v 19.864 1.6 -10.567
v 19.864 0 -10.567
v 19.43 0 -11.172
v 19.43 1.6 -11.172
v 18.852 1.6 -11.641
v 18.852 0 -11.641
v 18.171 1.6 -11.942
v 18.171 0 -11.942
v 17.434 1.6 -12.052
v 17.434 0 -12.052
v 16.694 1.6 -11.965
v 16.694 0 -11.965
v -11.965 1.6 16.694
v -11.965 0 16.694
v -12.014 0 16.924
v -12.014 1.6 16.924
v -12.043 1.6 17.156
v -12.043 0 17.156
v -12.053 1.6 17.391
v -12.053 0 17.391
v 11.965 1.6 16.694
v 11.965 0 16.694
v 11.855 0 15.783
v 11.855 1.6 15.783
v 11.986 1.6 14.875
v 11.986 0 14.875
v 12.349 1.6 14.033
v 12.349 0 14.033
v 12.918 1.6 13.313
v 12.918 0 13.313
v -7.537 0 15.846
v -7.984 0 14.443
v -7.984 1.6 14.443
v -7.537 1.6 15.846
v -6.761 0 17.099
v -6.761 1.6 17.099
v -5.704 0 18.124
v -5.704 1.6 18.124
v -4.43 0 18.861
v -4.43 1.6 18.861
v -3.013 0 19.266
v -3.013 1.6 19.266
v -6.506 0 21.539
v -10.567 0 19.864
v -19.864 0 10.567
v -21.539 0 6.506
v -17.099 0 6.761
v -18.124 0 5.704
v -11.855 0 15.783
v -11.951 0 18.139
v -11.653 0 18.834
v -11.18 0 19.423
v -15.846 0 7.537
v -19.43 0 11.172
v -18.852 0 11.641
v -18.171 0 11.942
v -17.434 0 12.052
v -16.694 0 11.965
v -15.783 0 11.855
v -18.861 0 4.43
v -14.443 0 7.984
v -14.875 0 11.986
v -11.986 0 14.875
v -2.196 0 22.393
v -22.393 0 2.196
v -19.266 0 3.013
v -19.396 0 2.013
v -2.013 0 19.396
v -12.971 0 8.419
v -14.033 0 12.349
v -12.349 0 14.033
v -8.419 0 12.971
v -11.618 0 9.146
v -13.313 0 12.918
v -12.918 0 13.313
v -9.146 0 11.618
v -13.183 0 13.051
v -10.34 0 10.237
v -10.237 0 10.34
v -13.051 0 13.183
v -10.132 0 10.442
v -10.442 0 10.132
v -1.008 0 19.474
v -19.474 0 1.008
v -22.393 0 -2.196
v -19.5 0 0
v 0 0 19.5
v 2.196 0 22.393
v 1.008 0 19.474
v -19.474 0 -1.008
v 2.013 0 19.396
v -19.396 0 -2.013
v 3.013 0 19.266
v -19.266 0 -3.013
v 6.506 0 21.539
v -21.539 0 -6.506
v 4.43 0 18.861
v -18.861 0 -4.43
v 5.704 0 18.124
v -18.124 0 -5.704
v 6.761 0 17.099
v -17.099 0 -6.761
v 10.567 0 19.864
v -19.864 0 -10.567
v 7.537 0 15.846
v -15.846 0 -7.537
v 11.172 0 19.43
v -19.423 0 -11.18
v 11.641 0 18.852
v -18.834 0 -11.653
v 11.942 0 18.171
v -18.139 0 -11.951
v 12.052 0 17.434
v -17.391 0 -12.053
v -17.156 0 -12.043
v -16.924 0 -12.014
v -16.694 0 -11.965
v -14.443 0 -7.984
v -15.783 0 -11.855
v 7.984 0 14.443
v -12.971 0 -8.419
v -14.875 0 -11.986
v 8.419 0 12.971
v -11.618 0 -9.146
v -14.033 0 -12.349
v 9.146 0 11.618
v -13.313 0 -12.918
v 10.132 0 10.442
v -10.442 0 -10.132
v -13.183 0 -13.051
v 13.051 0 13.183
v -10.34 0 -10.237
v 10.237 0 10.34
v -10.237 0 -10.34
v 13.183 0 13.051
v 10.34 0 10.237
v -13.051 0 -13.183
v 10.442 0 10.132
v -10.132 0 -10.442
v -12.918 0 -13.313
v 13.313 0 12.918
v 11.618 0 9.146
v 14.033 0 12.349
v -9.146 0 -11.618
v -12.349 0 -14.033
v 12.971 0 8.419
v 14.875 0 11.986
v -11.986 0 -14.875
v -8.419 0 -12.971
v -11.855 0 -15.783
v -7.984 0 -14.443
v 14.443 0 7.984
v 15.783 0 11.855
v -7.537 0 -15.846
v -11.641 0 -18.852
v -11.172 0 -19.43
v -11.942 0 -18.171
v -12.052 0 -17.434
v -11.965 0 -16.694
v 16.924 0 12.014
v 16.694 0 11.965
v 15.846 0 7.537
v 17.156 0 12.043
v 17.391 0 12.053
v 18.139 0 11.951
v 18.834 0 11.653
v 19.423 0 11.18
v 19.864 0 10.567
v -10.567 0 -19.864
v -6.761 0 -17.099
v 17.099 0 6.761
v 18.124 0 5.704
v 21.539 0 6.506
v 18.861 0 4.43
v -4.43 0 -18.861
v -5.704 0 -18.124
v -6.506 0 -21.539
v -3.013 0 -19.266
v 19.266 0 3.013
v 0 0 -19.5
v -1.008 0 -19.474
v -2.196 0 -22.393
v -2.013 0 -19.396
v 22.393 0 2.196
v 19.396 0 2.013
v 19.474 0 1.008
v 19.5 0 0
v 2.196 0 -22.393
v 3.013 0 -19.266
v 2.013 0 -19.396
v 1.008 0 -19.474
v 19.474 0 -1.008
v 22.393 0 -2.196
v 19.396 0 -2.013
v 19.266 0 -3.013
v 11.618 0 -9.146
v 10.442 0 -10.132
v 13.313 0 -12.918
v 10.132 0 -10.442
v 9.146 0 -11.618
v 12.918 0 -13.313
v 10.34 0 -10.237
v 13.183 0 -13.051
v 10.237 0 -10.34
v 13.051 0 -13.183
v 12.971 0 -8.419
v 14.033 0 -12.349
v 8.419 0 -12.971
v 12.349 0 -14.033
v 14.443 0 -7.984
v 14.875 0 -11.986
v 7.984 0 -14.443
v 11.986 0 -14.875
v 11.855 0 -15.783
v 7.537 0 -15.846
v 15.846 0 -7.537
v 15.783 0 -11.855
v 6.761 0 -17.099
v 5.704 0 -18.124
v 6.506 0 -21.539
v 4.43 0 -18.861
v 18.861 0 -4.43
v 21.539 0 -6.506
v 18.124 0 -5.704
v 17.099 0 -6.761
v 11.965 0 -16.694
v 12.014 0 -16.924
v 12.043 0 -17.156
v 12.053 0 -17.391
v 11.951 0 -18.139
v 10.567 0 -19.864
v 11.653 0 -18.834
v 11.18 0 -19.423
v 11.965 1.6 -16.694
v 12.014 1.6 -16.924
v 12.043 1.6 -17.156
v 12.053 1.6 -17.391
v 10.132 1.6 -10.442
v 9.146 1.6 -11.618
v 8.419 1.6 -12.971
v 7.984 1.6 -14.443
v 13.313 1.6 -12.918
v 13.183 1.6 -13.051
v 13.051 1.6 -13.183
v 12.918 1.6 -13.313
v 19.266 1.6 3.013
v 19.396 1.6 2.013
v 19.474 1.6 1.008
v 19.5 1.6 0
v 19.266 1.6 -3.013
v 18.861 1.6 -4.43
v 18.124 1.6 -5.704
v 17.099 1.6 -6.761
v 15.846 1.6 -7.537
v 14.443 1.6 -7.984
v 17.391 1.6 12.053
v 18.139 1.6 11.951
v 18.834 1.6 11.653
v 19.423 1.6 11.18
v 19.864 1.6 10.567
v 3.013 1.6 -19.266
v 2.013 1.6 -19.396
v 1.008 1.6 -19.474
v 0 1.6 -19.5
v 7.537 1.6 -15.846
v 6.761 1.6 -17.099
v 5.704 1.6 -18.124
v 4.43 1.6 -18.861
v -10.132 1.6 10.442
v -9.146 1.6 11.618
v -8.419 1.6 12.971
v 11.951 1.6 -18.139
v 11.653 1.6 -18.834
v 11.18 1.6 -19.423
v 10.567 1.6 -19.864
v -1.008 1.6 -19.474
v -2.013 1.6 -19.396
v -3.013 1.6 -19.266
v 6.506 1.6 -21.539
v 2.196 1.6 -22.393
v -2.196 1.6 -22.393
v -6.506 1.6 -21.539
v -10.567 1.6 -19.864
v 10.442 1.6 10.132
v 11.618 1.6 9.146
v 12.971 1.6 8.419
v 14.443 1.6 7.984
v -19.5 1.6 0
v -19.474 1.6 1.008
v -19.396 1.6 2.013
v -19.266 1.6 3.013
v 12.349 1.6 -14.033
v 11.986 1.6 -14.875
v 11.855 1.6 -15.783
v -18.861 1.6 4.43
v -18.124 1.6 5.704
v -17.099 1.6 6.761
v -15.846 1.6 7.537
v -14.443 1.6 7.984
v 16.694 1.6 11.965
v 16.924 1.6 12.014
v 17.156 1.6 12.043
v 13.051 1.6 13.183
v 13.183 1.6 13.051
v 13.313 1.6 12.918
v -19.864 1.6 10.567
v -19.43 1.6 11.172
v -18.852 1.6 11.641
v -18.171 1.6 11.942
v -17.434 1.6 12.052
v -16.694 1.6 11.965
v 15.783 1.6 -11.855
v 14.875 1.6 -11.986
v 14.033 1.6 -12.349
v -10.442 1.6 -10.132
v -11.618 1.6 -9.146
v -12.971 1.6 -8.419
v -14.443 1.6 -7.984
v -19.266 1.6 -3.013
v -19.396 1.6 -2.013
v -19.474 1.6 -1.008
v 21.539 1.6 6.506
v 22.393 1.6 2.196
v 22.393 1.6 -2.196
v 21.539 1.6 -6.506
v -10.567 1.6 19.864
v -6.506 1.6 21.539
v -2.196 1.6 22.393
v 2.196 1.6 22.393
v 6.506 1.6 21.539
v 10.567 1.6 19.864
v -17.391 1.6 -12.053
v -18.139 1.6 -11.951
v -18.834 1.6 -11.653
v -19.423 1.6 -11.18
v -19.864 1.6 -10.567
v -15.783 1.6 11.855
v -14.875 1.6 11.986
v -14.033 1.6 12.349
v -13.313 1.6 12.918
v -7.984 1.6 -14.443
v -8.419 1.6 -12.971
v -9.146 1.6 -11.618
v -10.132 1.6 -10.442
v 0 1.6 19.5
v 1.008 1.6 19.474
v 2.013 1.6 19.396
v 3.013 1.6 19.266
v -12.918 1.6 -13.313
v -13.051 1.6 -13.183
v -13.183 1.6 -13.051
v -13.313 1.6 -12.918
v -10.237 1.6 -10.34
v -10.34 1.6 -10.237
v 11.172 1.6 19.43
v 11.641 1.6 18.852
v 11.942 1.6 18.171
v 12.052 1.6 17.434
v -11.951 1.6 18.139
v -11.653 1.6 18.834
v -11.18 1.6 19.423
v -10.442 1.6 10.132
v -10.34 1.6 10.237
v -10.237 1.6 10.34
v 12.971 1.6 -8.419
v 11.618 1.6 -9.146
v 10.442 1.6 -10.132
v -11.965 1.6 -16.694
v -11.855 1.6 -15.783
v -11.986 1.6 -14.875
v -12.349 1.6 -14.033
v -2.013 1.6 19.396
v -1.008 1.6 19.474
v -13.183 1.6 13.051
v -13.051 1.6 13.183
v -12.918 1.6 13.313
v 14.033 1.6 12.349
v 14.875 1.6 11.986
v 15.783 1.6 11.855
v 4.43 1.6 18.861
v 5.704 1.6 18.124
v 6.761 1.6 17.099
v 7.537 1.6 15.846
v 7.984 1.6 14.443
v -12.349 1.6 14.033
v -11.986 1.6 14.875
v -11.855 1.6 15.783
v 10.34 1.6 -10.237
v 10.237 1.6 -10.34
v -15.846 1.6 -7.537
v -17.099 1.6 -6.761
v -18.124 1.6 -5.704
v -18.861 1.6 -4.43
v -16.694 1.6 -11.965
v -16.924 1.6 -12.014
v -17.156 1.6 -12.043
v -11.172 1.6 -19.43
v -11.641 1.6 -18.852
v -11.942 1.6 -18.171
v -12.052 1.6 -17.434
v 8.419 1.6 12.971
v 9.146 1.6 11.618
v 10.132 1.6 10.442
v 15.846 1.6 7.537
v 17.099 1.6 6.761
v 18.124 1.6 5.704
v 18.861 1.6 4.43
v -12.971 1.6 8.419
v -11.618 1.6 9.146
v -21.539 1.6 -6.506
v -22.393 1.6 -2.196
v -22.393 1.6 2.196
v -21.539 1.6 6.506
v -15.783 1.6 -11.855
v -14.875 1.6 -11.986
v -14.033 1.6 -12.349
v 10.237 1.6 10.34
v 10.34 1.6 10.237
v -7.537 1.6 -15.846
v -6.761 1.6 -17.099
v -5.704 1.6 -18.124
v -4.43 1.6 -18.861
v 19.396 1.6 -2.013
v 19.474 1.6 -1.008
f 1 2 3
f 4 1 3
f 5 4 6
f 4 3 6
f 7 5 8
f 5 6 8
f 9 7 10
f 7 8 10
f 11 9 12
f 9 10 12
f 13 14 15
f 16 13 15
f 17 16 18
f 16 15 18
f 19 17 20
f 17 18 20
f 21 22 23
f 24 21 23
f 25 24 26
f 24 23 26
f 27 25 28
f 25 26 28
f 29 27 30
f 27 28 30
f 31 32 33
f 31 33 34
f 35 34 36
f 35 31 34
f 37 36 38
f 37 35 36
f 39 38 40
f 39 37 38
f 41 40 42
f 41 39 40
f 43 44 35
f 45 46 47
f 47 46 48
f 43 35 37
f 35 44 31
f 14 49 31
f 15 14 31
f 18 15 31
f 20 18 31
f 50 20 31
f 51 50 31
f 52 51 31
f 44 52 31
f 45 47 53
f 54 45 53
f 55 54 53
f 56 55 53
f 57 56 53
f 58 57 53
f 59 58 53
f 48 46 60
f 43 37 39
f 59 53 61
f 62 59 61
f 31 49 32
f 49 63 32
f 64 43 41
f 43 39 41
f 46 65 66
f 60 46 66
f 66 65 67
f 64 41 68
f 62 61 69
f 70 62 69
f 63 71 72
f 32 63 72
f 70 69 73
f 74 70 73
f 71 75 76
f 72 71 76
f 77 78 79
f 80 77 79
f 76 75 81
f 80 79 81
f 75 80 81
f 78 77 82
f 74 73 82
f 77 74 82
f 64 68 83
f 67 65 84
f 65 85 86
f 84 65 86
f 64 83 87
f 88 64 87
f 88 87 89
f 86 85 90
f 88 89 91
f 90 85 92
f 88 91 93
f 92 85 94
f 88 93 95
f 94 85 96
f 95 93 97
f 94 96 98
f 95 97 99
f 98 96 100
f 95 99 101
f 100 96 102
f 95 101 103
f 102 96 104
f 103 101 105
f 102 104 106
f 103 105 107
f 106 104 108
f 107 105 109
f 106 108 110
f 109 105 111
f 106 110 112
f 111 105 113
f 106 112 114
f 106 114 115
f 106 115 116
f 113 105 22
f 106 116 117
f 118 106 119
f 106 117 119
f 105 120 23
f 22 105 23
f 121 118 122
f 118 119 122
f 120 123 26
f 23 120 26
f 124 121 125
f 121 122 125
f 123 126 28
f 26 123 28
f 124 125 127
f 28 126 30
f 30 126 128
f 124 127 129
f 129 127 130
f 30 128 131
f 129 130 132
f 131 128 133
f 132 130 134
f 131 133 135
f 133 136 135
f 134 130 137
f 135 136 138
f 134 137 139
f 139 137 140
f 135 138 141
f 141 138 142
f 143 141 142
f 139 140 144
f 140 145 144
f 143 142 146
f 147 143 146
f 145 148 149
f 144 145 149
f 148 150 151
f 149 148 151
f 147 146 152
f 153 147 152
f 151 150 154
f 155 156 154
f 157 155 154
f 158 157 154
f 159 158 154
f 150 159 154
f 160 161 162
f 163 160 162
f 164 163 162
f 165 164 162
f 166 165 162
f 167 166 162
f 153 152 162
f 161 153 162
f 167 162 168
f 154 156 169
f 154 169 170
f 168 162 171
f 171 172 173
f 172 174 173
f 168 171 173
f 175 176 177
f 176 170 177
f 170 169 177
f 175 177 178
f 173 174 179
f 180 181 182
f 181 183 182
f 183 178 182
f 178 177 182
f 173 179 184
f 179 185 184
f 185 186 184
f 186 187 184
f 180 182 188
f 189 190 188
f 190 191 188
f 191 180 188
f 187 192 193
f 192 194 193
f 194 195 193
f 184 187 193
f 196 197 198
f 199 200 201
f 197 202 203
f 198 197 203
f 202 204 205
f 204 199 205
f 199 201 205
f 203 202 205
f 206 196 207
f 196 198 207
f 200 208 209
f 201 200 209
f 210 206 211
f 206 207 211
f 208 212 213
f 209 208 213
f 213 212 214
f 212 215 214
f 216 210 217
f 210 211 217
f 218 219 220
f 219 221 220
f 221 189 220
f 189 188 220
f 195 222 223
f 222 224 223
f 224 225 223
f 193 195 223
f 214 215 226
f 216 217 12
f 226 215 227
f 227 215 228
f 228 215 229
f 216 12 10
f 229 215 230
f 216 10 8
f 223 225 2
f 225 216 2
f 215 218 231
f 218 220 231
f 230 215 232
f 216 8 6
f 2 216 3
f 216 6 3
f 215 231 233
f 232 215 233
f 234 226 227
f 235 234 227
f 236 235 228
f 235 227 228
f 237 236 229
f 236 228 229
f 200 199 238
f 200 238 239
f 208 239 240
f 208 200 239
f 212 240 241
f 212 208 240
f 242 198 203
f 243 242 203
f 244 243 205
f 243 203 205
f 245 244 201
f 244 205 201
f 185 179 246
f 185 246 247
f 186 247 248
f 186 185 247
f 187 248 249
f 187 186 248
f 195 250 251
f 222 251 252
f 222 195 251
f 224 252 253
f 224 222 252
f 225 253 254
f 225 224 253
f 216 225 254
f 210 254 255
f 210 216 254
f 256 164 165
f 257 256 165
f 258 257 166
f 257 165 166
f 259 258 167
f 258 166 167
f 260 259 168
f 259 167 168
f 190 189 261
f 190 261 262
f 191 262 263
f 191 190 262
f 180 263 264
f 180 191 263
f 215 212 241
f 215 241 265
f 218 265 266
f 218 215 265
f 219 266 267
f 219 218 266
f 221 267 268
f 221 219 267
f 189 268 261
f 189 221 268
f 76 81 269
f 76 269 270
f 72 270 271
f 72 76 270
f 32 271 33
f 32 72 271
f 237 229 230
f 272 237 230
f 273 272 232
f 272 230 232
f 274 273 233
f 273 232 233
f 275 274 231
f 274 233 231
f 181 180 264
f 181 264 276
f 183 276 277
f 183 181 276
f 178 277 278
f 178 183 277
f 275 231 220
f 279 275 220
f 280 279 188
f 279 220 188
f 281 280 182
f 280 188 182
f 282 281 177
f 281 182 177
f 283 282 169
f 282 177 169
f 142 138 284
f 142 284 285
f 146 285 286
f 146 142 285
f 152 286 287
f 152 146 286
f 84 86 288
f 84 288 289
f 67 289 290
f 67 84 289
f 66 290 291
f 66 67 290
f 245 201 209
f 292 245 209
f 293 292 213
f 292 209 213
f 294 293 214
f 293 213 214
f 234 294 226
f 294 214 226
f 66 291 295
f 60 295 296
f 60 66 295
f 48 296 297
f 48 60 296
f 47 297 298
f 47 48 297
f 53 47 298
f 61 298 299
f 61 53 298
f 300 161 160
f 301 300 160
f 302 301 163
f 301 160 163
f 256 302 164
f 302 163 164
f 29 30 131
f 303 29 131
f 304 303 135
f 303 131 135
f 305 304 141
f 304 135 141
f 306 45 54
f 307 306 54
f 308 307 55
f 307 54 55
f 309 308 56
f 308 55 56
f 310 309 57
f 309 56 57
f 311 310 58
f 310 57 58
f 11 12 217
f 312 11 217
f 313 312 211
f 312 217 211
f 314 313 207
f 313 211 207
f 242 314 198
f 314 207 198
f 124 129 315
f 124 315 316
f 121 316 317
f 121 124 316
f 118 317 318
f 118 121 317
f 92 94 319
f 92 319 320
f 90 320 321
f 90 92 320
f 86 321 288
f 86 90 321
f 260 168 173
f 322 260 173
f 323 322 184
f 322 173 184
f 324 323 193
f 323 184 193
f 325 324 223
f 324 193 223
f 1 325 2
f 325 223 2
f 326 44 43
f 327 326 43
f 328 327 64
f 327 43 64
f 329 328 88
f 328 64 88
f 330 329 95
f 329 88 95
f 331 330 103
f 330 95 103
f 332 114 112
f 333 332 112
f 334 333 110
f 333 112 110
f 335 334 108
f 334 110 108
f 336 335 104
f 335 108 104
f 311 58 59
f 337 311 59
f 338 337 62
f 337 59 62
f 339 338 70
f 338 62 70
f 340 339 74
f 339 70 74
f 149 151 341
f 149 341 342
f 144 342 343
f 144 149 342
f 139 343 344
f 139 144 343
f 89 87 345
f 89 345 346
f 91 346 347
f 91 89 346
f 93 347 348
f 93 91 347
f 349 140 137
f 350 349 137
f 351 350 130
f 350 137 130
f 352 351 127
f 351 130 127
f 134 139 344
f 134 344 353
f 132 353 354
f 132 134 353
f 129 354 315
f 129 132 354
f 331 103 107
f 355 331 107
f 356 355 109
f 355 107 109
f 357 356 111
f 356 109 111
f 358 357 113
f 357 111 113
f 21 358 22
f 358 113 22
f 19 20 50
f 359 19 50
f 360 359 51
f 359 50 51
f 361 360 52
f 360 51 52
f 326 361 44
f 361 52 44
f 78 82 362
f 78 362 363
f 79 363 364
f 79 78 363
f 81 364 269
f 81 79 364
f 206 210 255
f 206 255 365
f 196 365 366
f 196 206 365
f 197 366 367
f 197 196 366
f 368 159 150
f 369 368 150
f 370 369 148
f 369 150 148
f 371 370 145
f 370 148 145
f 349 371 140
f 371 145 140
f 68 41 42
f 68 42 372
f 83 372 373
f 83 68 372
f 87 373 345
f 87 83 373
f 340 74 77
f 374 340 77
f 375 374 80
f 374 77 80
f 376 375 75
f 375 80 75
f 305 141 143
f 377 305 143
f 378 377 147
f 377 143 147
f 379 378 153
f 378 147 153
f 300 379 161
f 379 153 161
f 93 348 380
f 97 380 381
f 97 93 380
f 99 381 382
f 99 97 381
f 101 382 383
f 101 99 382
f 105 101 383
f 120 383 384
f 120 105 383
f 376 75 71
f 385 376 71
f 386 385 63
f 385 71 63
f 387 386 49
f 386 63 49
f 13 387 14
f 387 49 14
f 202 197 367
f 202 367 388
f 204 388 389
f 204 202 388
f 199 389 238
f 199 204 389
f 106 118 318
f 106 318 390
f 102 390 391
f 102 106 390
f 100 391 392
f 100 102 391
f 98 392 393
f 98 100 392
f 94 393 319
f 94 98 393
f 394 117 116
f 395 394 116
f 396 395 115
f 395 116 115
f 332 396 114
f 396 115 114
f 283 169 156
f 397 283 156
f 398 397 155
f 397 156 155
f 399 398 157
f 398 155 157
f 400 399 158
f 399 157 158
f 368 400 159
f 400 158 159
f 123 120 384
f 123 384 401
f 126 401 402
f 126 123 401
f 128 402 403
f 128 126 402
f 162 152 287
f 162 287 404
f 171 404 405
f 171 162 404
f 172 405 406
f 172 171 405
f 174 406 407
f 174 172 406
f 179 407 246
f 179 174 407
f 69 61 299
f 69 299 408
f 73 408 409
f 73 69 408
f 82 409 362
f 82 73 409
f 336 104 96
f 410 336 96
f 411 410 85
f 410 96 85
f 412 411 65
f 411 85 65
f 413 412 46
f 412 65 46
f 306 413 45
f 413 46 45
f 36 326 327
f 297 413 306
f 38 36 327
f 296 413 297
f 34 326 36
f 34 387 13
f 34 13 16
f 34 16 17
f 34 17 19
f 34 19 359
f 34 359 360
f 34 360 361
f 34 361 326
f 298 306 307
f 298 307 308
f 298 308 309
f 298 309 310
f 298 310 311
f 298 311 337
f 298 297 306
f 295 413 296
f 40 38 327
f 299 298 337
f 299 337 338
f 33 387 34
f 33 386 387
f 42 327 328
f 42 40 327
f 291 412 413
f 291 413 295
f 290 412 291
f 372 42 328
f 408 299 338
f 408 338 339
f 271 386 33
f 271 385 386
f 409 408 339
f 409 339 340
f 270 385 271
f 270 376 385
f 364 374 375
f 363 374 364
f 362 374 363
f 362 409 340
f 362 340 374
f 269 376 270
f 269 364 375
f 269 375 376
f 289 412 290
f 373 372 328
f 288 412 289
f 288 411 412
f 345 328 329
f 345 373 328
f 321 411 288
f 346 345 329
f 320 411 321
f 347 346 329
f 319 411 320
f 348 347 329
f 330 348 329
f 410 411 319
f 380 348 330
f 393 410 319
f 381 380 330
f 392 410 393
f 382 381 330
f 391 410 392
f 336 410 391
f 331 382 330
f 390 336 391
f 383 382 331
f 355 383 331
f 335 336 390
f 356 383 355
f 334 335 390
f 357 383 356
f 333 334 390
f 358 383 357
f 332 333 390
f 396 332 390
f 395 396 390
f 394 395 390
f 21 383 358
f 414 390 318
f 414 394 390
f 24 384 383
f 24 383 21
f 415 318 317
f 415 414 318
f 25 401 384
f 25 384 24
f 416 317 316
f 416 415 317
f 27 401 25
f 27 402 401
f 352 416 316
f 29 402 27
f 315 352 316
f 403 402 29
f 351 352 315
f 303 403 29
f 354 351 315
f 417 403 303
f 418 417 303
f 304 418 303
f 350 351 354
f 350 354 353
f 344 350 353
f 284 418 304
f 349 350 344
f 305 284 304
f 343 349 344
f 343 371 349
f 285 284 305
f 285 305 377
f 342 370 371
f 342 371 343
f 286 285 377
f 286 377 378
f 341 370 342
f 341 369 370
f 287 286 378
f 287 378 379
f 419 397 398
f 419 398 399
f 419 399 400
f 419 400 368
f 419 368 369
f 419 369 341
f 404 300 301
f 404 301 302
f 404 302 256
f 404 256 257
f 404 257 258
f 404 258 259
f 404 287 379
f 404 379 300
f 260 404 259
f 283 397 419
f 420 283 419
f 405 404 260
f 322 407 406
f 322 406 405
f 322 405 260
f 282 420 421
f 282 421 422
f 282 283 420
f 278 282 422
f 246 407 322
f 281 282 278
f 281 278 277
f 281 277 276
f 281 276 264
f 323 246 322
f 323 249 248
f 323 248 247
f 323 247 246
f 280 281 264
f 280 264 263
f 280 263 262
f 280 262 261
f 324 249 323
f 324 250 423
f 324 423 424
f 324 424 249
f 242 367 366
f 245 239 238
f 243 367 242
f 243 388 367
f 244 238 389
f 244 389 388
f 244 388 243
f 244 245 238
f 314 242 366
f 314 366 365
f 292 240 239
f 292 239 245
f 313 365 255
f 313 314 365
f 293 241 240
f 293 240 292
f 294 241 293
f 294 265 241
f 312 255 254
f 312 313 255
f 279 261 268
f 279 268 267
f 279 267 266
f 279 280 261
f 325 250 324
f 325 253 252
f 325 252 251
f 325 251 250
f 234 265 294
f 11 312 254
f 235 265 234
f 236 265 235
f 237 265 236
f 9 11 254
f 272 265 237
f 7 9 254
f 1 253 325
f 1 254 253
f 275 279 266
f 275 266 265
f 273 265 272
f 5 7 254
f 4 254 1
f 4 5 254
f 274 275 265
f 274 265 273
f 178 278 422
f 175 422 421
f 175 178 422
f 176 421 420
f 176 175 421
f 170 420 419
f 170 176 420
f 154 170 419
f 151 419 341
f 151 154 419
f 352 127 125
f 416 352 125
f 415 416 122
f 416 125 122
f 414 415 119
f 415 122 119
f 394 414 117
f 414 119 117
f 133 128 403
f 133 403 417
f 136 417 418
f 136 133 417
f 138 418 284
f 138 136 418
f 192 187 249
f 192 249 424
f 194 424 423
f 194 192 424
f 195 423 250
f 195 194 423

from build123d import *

# Parameters (mm, degrees)
BOSS_EXTRUDE1_DEPTH = 1.6
CUT_EXTRUDE2_DEPTH  = 2.6


with BuildPart() as part:
    # Internal Slab → Boss-Extrude1 (new body)
    with BuildSketch(Plane(origin=(0, 0, 0), x_dir=(1, 0, 0), z_dir=(0, 1, 0))):
        with BuildLine():
            ThreePointArc((19.864398082, 10.566725549), (18.521398428, 11.814512636), (16.694380928, 11.964937844))
            ThreePointArc((16.694380928, 11.964937844), (14.875391632, 11.986370035), (13.312847331, 12.91784022))
            ThreePointArc((13.312847331, 12.91784022), (13.116830791, 13.116830791), (12.91784022, 13.312847331))
            ThreePointArc((12.91784022, 13.312847331), (11.986370035, 14.875391632), (11.964937844, 16.694380928))
            ThreePointArc((11.964937844, 16.694380928), (12.030759646, 17.039737643), (12.052815994, 17.390618375))
            ThreePointArc((12.052815994, 17.390618375), (11.652730082, 18.833536499), (10.566725549, 19.864398082))
            ThreePointArc((10.566725549, 19.864398082), (0, 22.5), (-10.566725549, 19.864398082))
            ThreePointArc((-10.566725549, 19.864398082), (-11.814512636, 18.521398428), (-11.964937844, 16.694380928))
            ThreePointArc((-11.964937844, 16.694380928), (-11.986370035, 14.875391632), (-12.91784022, 13.312847331))
            ThreePointArc((-12.91784022, 13.312847331), (-13.116830791, 13.116830791), (-13.312847331, 12.91784022))
            ThreePointArc((-13.312847331, 12.91784022), (-14.875391632, 11.986370035), (-16.694380928, 11.964937844))
            ThreePointArc((-16.694380928, 11.964937844), (-17.039737643, 12.030759646), (-17.390618375, 12.052815994))
            ThreePointArc((-17.390618375, 12.052815994), (-18.833536499, 11.652730082), (-19.864398082, 10.566725549))
            ThreePointArc((-19.864398082, 10.566725549), (-22.5, 0), (-19.864398082, -10.566725549))
            ThreePointArc((-19.864398082, -10.566725549), (-18.521398428, -11.814512636), (-16.694380928, -11.964937844))
            ThreePointArc((-16.694380928, -11.964937844), (-14.875391632, -11.986370035), (-13.312847331, -12.91784022))
            ThreePointArc((-13.312847331, -12.91784022), (-13.116830791, -13.116830791), (-12.91784022, -13.312847331))
            ThreePointArc((-12.91784022, -13.312847331), (-11.986370035, -14.875391632), (-11.964937844, -16.694380928))
            ThreePointArc((-11.964937844, -16.694380928), (-12.030759646, -17.039737643), (-12.052815994, -17.390618375))
            ThreePointArc((-12.052815994, -17.390618375), (-11.652730082, -18.833536499), (-10.566725549, -19.864398082))
            ThreePointArc((-10.566725549, -19.864398082), (0, -22.5), (10.566725549, -19.864398082))
            ThreePointArc((10.566725549, -19.864398082), (11.814512636, -18.521398428), (11.964937844, -16.694380928))
            ThreePointArc((11.964937844, -16.694380928), (11.986370035, -14.875391632), (12.91784022, -13.312847331))
            ThreePointArc((12.91784022, -13.312847331), (13.116830791, -13.116830791), (13.312847331, -12.91784022))
            ThreePointArc((13.312847331, -12.91784022), (14.875391632, -11.986370035), (16.694380928, -11.964937844))
            ThreePointArc((16.694380928, -11.964937844), (17.039737643, -12.030759646), (17.390618375, -12.052815994))
            ThreePointArc((17.390618375, -12.052815994), (18.833536499, -11.652730082), (19.864398082, -10.566725549))
            ThreePointArc((19.864398082, -10.566725549), (22.5, 0), (19.864398082, 10.566725549))
        make_face()
    extrude(amount=BOSS_EXTRUDE1_DEPTH)

    # Sketch3 → Cut-Extrude2 (cut, through all)
    with BuildSketch(Plane(origin=(0, 0, 0), x_dir=(1, 0, 0), z_dir=(0, 1, 0))):
        with BuildLine():
            ThreePointArc((-14.443108961, 7.983520749), (-17.643874139, 6.264479657), (-19.265757154, 3.013403606))
            ThreePointArc((-19.265757154, 3.013403606), (-19.441351091, 1.511247085), (-19.5, 0))
            ThreePointArc((-19.5, 0), (-19.441351091, -1.511247085), (-19.265757154, -3.013403606))
            ThreePointArc((-19.265757154, -3.013403606), (-17.643874139, -6.264479657), (-14.443108961, -7.983520749))
            ThreePointArc((-14.443108961, -7.983520749), (-12.276076656, -8.747806411), (-10.442152488, -10.132322113))
            ThreePointArc((-10.442152488, -10.132322113), (-10.288403666, -10.288403666), (-10.132322113, -10.442152488))
            ThreePointArc((-10.132322113, -10.442152488), (-8.747806411, -12.276076656), (-7.983520749, -14.443108961))
            ThreePointArc((-7.983520749, -14.443108961), (-6.264479657, -17.643874139), (-3.013403606, -19.265757154))
            ThreePointArc((-3.013403606, -19.265757154), (-1.511247085, -19.441351091), (0, -19.5))
            ThreePointArc((0, -19.5), (1.511247085, -19.441351091), (3.013403606, -19.265757154))
            ThreePointArc((3.013403606, -19.265757154), (6.264479657, -17.643874139), (7.983520749, -14.443108961))
            ThreePointArc((7.983520749, -14.443108961), (8.747806411, -12.276076656), (10.132322113, -10.442152488))
            ThreePointArc((10.132322113, -10.442152488), (10.288403666, -10.288403666), (10.442152488, -10.132322113))
            ThreePointArc((10.442152488, -10.132322113), (12.276076656, -8.747806411), (14.443108961, -7.983520749))
            ThreePointArc((14.443108961, -7.983520749), (17.643874139, -6.264479657), (19.265757154, -3.013403606))
            ThreePointArc((19.265757154, -3.013403606), (19.441351091, -1.511247085), (19.5, 0))
            ThreePointArc((19.5, 0), (19.441351091, 1.511247085), (19.265757154, 3.013403606))
            ThreePointArc((19.265757154, 3.013403606), (17.643874139, 6.264479657), (14.443108961, 7.983520749))
            ThreePointArc((14.443108961, 7.983520749), (12.276076656, 8.747806411), (10.442152488, 10.132322113))
            ThreePointArc((10.442152488, 10.132322113), (10.288403666, 10.288403666), (10.132322113, 10.442152488))
            ThreePointArc((10.132322113, 10.442152488), (8.747806411, 12.276076656), (7.983520749, 14.443108961))
            ThreePointArc((7.983520749, 14.443108961), (6.264479657, 17.643874139), (3.013403606, 19.265757154))
            ThreePointArc((3.013403606, 19.265757154), (1.511247085, 19.441351091), (0, 19.5))
            ThreePointArc((0, 19.5), (-1.511247085, 19.441351091), (-3.013403606, 19.265757154))
            ThreePointArc((-3.013403606, 19.265757154), (-6.264479657, 17.643874139), (-7.983520749, 14.443108961))
            ThreePointArc((-7.983520749, 14.443108961), (-8.747806411, 12.276076656), (-10.132322113, 10.442152488))
            ThreePointArc((-10.132322113, 10.442152488), (-10.288403666, 10.288403666), (-10.442152488, 10.132322113))
            ThreePointArc((-10.442152488, 10.132322113), (-12.276076656, 8.747806411), (-14.443108961, 7.983520749))
        make_face()
    extrude(amount=CUT_EXTRUDE2_DEPTH, mode=Mode.SUBTRACT)


solid = part.part
